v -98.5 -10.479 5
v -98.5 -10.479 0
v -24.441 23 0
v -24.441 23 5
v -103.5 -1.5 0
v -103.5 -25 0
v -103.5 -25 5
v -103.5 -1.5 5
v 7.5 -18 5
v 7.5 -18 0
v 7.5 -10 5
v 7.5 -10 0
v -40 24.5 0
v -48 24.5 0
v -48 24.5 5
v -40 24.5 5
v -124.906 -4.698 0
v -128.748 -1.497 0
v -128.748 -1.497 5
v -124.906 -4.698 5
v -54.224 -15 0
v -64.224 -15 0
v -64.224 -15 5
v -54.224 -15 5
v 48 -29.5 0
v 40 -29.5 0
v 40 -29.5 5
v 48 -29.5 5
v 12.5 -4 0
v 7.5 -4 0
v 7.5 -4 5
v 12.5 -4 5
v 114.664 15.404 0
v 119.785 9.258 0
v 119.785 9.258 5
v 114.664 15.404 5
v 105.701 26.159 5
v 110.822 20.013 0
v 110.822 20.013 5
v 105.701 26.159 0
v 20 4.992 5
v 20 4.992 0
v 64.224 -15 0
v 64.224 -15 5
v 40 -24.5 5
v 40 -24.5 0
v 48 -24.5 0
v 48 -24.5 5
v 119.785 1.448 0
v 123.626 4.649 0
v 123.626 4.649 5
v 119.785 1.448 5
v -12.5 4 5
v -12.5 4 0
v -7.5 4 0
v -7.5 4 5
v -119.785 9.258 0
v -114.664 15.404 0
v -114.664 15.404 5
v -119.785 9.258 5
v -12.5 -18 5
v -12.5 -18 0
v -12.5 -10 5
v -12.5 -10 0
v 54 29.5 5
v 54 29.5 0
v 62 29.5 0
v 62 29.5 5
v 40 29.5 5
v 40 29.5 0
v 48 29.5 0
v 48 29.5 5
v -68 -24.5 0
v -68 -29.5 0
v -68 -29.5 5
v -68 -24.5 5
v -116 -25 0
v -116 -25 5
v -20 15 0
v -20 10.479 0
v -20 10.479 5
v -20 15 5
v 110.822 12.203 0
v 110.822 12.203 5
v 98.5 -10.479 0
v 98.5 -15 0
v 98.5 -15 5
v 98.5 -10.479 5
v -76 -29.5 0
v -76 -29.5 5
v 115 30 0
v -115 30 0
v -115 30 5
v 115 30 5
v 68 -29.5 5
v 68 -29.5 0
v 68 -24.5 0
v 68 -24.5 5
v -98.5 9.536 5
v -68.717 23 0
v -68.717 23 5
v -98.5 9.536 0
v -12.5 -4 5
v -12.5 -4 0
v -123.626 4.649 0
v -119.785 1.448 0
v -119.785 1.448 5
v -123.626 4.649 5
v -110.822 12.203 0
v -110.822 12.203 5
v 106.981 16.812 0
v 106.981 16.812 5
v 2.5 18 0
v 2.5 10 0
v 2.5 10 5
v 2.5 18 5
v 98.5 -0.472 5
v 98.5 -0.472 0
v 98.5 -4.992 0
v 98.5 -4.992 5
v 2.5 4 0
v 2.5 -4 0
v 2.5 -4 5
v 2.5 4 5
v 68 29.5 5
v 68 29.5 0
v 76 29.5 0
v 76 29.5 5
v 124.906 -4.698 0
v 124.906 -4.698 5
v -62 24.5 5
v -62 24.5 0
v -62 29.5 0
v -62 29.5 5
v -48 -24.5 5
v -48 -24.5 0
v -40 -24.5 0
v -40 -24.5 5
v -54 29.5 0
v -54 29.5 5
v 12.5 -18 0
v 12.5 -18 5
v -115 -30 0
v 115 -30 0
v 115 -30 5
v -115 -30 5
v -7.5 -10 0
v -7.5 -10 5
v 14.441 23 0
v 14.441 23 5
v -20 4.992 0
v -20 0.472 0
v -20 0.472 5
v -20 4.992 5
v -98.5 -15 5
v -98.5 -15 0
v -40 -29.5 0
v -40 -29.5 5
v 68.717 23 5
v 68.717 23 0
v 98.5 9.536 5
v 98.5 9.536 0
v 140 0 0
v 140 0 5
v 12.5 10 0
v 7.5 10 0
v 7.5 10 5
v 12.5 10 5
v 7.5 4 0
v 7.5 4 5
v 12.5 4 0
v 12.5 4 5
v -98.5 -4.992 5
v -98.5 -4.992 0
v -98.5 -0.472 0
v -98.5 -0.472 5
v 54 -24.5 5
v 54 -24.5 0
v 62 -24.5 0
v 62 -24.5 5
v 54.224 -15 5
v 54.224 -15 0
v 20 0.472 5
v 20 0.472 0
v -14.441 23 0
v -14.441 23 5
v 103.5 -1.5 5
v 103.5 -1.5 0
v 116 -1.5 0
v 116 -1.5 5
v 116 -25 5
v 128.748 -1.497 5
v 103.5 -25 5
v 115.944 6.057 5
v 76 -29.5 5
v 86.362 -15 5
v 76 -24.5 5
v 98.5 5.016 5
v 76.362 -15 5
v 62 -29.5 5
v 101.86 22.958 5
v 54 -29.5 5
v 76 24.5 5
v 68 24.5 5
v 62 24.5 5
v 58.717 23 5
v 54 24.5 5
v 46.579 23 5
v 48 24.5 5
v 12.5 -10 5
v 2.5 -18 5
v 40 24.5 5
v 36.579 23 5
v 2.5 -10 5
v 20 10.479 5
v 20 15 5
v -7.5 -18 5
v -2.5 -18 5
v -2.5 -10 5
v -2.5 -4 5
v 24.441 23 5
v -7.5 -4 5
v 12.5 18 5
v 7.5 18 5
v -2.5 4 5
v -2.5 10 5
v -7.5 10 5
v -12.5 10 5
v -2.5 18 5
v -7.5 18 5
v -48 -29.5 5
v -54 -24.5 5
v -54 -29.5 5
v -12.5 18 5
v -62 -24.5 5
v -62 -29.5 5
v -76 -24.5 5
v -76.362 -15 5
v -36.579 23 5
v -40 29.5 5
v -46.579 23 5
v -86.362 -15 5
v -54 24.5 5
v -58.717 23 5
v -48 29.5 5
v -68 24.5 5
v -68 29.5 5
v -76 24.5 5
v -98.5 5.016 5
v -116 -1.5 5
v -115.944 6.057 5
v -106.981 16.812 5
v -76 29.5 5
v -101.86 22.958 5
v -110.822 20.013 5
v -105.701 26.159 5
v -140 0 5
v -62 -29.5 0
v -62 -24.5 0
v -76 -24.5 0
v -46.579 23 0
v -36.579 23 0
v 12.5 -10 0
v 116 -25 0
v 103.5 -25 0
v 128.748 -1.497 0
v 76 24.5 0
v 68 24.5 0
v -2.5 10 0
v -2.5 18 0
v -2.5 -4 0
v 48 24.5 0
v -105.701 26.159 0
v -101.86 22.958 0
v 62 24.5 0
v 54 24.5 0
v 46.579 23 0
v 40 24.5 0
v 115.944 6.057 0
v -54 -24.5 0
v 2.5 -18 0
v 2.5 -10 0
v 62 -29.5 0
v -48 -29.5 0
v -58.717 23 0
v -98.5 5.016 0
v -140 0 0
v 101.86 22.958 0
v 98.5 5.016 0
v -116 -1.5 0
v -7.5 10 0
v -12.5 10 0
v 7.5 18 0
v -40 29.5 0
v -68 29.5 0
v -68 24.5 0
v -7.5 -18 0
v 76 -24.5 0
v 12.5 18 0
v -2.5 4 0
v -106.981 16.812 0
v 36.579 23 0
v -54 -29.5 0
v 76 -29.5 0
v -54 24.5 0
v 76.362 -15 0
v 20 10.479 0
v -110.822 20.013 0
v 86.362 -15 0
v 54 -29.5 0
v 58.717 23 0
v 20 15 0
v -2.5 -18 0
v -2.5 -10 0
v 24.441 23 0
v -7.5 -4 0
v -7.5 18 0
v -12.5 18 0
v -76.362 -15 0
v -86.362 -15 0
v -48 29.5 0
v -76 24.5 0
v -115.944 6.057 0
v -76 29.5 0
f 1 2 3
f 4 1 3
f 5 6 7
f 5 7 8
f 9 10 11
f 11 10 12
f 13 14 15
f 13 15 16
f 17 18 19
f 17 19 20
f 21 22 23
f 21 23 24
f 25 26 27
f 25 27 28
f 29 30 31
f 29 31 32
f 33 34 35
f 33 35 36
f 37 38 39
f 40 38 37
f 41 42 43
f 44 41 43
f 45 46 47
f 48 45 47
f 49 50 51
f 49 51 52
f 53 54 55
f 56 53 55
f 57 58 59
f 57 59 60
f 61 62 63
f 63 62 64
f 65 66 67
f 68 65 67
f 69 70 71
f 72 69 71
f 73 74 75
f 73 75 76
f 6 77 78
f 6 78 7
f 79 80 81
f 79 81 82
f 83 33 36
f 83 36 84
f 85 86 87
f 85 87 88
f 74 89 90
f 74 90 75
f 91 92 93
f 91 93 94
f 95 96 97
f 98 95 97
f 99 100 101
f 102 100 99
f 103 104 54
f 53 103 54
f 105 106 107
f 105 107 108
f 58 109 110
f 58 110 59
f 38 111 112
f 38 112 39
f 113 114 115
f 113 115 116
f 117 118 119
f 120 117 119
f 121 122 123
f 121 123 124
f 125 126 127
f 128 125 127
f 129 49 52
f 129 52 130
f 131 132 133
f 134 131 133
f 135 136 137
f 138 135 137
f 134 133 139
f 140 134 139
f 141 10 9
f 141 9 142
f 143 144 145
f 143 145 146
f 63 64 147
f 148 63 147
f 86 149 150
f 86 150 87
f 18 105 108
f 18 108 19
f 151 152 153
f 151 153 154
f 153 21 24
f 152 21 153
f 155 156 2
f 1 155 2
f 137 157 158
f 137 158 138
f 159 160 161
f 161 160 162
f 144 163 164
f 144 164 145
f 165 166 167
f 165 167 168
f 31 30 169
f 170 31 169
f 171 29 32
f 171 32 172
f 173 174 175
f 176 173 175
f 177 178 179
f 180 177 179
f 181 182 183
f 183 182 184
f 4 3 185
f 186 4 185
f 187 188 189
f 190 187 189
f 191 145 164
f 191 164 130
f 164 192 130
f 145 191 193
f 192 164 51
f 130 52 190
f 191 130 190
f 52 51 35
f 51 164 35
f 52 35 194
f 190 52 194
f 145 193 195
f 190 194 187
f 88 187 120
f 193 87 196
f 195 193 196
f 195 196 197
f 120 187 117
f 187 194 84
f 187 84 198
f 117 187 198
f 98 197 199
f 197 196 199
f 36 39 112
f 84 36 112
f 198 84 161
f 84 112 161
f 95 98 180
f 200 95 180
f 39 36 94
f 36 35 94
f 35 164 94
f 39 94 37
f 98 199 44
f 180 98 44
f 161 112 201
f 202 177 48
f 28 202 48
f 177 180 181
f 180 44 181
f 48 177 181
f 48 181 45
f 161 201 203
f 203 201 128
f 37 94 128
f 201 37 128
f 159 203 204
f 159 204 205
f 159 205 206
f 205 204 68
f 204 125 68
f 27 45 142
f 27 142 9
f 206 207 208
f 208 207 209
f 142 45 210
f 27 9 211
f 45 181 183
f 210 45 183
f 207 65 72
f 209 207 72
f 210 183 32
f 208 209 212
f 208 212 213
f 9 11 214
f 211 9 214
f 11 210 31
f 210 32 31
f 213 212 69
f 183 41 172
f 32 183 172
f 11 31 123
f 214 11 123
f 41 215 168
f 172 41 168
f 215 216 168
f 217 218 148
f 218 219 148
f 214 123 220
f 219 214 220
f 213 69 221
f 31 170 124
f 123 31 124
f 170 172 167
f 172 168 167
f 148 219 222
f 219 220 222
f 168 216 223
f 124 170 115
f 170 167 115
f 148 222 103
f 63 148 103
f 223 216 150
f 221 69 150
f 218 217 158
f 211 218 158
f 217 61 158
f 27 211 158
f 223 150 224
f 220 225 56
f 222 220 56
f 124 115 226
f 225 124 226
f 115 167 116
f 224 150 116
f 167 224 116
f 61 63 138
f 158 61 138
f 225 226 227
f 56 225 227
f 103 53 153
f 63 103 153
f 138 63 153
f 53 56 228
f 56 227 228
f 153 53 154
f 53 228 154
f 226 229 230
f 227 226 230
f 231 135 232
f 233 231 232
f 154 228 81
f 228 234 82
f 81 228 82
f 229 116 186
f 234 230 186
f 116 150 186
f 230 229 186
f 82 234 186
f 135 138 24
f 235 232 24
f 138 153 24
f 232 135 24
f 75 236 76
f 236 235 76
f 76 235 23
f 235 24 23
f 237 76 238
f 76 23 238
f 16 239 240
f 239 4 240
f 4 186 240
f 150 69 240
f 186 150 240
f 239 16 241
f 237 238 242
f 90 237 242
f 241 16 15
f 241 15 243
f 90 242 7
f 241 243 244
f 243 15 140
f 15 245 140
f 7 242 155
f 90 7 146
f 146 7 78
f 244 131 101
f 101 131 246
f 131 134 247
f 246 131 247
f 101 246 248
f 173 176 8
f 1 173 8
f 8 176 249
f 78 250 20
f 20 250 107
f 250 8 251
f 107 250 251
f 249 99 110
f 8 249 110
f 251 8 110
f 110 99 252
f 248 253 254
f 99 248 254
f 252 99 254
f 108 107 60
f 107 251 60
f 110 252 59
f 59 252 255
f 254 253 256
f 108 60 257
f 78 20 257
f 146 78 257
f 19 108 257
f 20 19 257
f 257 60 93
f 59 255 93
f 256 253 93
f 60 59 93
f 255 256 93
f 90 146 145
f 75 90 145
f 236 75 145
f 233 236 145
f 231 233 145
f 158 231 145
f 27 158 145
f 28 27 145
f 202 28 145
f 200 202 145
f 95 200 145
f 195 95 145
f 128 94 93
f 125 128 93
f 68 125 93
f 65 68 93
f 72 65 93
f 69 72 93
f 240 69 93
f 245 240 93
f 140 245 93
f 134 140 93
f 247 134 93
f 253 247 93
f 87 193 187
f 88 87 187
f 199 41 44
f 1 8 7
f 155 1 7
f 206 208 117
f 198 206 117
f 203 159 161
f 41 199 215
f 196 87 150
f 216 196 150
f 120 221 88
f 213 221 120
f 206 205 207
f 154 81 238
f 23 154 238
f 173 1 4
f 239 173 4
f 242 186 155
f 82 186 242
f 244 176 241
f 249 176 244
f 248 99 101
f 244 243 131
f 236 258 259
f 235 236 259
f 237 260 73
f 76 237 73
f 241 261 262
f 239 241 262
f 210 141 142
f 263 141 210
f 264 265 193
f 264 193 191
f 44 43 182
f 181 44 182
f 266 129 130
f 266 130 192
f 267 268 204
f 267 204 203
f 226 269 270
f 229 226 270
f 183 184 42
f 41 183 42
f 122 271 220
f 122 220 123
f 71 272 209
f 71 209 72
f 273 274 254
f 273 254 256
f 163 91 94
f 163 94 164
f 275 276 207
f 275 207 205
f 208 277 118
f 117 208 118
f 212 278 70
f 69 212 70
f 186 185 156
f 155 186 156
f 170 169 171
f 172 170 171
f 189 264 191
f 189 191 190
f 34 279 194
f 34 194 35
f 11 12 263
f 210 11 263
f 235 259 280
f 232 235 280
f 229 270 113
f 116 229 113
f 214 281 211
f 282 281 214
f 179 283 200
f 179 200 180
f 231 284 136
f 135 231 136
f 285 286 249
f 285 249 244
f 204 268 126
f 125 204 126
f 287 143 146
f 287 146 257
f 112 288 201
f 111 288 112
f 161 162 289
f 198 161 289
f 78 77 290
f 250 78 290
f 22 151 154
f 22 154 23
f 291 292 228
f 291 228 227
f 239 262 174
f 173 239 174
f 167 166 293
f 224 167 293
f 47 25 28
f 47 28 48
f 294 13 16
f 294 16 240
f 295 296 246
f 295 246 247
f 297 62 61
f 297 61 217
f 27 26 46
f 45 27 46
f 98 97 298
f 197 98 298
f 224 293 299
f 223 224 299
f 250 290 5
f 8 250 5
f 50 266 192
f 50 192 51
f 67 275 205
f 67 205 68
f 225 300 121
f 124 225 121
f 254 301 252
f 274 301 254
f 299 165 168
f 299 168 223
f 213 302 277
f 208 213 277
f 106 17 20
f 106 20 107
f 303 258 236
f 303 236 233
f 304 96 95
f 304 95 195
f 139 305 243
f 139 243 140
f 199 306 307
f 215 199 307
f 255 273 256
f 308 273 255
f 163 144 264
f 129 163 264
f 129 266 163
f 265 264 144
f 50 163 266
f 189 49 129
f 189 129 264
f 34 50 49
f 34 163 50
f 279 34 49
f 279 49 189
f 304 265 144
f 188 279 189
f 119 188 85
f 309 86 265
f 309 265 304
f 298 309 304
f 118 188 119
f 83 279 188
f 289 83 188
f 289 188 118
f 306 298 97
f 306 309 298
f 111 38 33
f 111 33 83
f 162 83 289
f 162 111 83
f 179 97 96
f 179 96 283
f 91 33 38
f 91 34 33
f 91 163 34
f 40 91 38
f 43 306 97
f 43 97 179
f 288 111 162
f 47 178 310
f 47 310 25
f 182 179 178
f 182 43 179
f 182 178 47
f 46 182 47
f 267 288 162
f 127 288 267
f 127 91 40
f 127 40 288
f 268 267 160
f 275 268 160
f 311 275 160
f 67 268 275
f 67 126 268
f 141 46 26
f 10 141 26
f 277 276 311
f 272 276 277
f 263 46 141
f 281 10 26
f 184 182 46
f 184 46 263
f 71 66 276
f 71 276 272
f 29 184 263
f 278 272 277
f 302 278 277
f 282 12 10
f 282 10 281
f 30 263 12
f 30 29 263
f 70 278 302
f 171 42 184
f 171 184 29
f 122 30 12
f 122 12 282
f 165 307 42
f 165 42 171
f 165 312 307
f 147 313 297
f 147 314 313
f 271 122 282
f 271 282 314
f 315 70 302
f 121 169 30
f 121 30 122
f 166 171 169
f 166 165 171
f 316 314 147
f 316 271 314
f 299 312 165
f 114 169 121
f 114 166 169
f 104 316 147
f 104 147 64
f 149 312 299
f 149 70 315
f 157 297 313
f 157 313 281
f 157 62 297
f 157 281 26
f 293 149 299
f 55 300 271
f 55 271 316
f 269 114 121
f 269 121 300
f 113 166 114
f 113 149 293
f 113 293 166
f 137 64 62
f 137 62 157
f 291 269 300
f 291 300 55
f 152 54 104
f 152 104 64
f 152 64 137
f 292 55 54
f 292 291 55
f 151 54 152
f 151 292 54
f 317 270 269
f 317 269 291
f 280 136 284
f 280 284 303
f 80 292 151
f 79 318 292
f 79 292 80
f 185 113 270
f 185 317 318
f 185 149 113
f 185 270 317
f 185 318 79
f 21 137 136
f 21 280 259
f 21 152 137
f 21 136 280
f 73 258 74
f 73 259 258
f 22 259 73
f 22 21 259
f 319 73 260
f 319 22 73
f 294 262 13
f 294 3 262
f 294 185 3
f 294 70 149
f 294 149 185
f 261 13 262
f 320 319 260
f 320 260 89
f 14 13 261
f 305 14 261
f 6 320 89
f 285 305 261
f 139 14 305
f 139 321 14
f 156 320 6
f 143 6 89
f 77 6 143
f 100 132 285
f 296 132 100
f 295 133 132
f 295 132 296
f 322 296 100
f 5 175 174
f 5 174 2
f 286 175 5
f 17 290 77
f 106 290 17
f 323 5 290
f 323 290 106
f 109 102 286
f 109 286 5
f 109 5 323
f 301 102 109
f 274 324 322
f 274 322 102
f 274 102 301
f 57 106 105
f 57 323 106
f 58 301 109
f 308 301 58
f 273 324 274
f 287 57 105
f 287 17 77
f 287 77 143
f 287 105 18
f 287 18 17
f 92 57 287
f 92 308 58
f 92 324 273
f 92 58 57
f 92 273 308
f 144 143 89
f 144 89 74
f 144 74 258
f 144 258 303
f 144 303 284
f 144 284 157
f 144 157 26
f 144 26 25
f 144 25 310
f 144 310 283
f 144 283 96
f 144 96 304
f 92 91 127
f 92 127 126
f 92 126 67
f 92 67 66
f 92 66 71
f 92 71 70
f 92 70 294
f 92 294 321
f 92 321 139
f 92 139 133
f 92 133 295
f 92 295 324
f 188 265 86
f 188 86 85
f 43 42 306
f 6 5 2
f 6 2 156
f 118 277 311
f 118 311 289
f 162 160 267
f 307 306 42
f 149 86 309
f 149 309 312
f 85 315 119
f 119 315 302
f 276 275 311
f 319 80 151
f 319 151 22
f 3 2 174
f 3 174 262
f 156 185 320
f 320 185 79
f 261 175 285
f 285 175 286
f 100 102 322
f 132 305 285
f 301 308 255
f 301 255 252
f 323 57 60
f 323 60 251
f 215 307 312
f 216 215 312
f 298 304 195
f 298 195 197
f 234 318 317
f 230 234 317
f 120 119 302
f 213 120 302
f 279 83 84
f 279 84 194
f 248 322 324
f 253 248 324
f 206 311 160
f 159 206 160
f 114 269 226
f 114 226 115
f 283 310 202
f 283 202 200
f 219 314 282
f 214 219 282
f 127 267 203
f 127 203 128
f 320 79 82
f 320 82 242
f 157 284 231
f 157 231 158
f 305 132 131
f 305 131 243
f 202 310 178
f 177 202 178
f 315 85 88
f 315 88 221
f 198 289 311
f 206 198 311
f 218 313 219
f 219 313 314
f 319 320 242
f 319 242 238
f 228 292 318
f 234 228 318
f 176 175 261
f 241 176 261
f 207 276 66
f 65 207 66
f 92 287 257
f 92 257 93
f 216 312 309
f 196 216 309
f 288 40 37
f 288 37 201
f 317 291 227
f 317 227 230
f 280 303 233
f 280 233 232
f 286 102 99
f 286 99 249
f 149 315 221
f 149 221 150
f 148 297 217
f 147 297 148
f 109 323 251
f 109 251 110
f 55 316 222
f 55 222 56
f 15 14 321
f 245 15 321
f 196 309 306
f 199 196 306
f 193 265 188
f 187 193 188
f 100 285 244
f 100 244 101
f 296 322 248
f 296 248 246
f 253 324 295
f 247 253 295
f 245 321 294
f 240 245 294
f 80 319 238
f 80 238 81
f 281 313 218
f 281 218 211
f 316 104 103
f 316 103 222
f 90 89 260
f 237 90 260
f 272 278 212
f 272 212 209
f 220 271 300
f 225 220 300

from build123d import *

# Parameters (mm, degrees)
SKETCH_1_W      = 12.5
SKETCH_1_H      = 23.5
SKETCH_1_W_2    = 5
SKETCH_1_H_2    = 8
SKETCH_1_W_3    = 8
SKETCH_1_H_3    = 5
EXTRUDE_1_DEPTH = 5


with BuildPart() as part:
    # 草图1 → 凸台-拉伸1 (new body)
    with BuildSketch(Plane.XY):
        Polygon((140, 0), (115, -30), (-115, -30), (-140, 0), (-115, 30), (115, 30), align=None)
        Polygon((-105.700921998, 26.158893602), (-110.822397196, 20.013123365), (-106.981290798, 16.812201367), (-101.8598156, 22.957971604), align=None, mode=Mode.SUBTRACT)
        Polygon((-114.663503594, 15.403795688), (-119.784978791, 9.258025451), (-115.943872393, 6.057103453), (-110.822397196, 12.202873689), align=None, mode=Mode.SUBTRACT)
        Polygon((-123.626085189, 4.648697773), (-128.747560386, -1.497072463), (-124.906453988, -4.697994462), (-119.784978791, 1.447775775), align=None, mode=Mode.SUBTRACT)
        Polygon((-98.5, -0.47150647), (-46.579460947, 23), (-36.579460947, 23), (-98.5, -4.992165712), (-98.5, -3), align=None, mode=Mode.SUBTRACT)
        with Locations((-109.75, -13.25)):
            Rectangle(SKETCH_1_W, SKETCH_1_H, mode=Mode.SUBTRACT)
        Rectangle(SKETCH_1_W_2, SKETCH_1_H_2, mode=Mode.SUBTRACT)
        with Locations((0, 14)):
            Rectangle(SKETCH_1_W_2, SKETCH_1_H_2, mode=Mode.SUBTRACT)
        with Locations((0, -14)):
            Rectangle(SKETCH_1_W_2, SKETCH_1_H_2, mode=Mode.SUBTRACT)
        Polygon((-98.5, -10.479340758), (-24.441463471, 23), (-14.441463471, 23), (-98.5, -15), align=None, mode=Mode.SUBTRACT)
        Polygon((-20, 15), (-86.362002523, -15), (-76.362002523, -15), (-20, 10.479340758), align=None, mode=Mode.SUBTRACT)
        Polygon((-20, 4.992165712), (-64.224005046, -15), (-54.224005046, -15), (-20, 0.47150647), align=None, mode=Mode.SUBTRACT)
        Polygon((-58.717458424, 23), (-68.717458424, 23), (-98.5, 9.536327819), (-98.5, 5.015668577), align=None, mode=Mode.SUBTRACT)
        Polygon((98.5, 5.015668577), (58.717458424, 23), (68.717458424, 23), (98.5, 9.536327819), align=None, mode=Mode.SUBTRACT)
        Polygon((20, 0.47150647), (20, 4.992165712), (64.224005046, -15), (54.224005046, -15), align=None, mode=Mode.SUBTRACT)
        Polygon((98.5, -15), (98.5, -10.479340758), (24.441463471, 23), (14.441463471, 23), align=None, mode=Mode.SUBTRACT)
        Polygon((20, 10.479340758), (20, 15), (86.362002523, -15), (76.362002523, -15), align=None, mode=Mode.SUBTRACT)
        Polygon((98.5, -0.47150647), (98.5, -3), (98.5, -4.992165712), (36.579460947, 23), (46.579460947, 23), align=None, mode=Mode.SUBTRACT)
        with Locations((109.75, -13.25)):
            Rectangle(SKETCH_1_W, SKETCH_1_H, mode=Mode.SUBTRACT)
        Polygon((119.784978791, 1.447775775), (124.906453988, -4.697994462), (128.747560386, -1.497072463), (123.626085189, 4.648697773), align=None, mode=Mode.SUBTRACT)
        Polygon((110.822397196, 12.202873689), (115.943872393, 6.057103453), (119.784978791, 9.258025451), (114.663503594, 15.403795688), align=None, mode=Mode.SUBTRACT)
        Polygon((101.8598156, 22.957971604), (106.981290798, 16.812201367), (110.822397196, 20.013123365), (105.700921998, 26.158893602), align=None, mode=Mode.SUBTRACT)
        with Locations((-10, 0)):
            Rectangle(SKETCH_1_W_2, SKETCH_1_H_2, mode=Mode.SUBTRACT)
        with Locations((-10, 14)):
            Rectangle(SKETCH_1_W_2, SKETCH_1_H_2, mode=Mode.SUBTRACT)
        with Locations((-10, -14)):
            Rectangle(SKETCH_1_W_2, SKETCH_1_H_2, mode=Mode.SUBTRACT)
        with Locations((10, -14)):
            Rectangle(SKETCH_1_W_2, SKETCH_1_H_2, mode=Mode.SUBTRACT)
        with Locations((10, 14)):
            Rectangle(SKETCH_1_W_2, SKETCH_1_H_2, mode=Mode.SUBTRACT)
        with Locations((10, 0)):
            Rectangle(SKETCH_1_W_2, SKETCH_1_H_2, mode=Mode.SUBTRACT)
        with Locations((-58, 27)):
            Rectangle(SKETCH_1_W_3, SKETCH_1_H_3, mode=Mode.SUBTRACT)
        with Locations((-72, 27)):
            Rectangle(SKETCH_1_W_3, SKETCH_1_H_3, mode=Mode.SUBTRACT)
        with Locations((-44, 27)):
            Rectangle(SKETCH_1_W_3, SKETCH_1_H_3, mode=Mode.SUBTRACT)
        with Locations((58, -27)):
            Rectangle(SKETCH_1_W_3, SKETCH_1_H_3, mode=Mode.SUBTRACT)
        with Locations((72, -27)):
            Rectangle(SKETCH_1_W_3, SKETCH_1_H_3, mode=Mode.SUBTRACT)
        with Locations((44, 27)):
            Rectangle(SKETCH_1_W_3, SKETCH_1_H_3, mode=Mode.SUBTRACT)
        with Locations((58, 27)):
            Rectangle(SKETCH_1_W_3, SKETCH_1_H_3, mode=Mode.SUBTRACT)
        with Locations((72, 27)):
            Rectangle(SKETCH_1_W_3, SKETCH_1_H_3, mode=Mode.SUBTRACT)
        with Locations((44, -27)):
            Rectangle(SKETCH_1_W_3, SKETCH_1_H_3, mode=Mode.SUBTRACT)
        with Locations((-44, -27)):
            Rectangle(SKETCH_1_W_3, SKETCH_1_H_3, mode=Mode.SUBTRACT)
        with Locations((-58, -27)):
            Rectangle(SKETCH_1_W_3, SKETCH_1_H_3, mode=Mode.SUBTRACT)
        with Locations((-72, -27)):
            Rectangle(SKETCH_1_W_3, SKETCH_1_H_3, mode=Mode.SUBTRACT)
    extrude(amount=EXTRUDE_1_DEPTH)


solid = part.part
